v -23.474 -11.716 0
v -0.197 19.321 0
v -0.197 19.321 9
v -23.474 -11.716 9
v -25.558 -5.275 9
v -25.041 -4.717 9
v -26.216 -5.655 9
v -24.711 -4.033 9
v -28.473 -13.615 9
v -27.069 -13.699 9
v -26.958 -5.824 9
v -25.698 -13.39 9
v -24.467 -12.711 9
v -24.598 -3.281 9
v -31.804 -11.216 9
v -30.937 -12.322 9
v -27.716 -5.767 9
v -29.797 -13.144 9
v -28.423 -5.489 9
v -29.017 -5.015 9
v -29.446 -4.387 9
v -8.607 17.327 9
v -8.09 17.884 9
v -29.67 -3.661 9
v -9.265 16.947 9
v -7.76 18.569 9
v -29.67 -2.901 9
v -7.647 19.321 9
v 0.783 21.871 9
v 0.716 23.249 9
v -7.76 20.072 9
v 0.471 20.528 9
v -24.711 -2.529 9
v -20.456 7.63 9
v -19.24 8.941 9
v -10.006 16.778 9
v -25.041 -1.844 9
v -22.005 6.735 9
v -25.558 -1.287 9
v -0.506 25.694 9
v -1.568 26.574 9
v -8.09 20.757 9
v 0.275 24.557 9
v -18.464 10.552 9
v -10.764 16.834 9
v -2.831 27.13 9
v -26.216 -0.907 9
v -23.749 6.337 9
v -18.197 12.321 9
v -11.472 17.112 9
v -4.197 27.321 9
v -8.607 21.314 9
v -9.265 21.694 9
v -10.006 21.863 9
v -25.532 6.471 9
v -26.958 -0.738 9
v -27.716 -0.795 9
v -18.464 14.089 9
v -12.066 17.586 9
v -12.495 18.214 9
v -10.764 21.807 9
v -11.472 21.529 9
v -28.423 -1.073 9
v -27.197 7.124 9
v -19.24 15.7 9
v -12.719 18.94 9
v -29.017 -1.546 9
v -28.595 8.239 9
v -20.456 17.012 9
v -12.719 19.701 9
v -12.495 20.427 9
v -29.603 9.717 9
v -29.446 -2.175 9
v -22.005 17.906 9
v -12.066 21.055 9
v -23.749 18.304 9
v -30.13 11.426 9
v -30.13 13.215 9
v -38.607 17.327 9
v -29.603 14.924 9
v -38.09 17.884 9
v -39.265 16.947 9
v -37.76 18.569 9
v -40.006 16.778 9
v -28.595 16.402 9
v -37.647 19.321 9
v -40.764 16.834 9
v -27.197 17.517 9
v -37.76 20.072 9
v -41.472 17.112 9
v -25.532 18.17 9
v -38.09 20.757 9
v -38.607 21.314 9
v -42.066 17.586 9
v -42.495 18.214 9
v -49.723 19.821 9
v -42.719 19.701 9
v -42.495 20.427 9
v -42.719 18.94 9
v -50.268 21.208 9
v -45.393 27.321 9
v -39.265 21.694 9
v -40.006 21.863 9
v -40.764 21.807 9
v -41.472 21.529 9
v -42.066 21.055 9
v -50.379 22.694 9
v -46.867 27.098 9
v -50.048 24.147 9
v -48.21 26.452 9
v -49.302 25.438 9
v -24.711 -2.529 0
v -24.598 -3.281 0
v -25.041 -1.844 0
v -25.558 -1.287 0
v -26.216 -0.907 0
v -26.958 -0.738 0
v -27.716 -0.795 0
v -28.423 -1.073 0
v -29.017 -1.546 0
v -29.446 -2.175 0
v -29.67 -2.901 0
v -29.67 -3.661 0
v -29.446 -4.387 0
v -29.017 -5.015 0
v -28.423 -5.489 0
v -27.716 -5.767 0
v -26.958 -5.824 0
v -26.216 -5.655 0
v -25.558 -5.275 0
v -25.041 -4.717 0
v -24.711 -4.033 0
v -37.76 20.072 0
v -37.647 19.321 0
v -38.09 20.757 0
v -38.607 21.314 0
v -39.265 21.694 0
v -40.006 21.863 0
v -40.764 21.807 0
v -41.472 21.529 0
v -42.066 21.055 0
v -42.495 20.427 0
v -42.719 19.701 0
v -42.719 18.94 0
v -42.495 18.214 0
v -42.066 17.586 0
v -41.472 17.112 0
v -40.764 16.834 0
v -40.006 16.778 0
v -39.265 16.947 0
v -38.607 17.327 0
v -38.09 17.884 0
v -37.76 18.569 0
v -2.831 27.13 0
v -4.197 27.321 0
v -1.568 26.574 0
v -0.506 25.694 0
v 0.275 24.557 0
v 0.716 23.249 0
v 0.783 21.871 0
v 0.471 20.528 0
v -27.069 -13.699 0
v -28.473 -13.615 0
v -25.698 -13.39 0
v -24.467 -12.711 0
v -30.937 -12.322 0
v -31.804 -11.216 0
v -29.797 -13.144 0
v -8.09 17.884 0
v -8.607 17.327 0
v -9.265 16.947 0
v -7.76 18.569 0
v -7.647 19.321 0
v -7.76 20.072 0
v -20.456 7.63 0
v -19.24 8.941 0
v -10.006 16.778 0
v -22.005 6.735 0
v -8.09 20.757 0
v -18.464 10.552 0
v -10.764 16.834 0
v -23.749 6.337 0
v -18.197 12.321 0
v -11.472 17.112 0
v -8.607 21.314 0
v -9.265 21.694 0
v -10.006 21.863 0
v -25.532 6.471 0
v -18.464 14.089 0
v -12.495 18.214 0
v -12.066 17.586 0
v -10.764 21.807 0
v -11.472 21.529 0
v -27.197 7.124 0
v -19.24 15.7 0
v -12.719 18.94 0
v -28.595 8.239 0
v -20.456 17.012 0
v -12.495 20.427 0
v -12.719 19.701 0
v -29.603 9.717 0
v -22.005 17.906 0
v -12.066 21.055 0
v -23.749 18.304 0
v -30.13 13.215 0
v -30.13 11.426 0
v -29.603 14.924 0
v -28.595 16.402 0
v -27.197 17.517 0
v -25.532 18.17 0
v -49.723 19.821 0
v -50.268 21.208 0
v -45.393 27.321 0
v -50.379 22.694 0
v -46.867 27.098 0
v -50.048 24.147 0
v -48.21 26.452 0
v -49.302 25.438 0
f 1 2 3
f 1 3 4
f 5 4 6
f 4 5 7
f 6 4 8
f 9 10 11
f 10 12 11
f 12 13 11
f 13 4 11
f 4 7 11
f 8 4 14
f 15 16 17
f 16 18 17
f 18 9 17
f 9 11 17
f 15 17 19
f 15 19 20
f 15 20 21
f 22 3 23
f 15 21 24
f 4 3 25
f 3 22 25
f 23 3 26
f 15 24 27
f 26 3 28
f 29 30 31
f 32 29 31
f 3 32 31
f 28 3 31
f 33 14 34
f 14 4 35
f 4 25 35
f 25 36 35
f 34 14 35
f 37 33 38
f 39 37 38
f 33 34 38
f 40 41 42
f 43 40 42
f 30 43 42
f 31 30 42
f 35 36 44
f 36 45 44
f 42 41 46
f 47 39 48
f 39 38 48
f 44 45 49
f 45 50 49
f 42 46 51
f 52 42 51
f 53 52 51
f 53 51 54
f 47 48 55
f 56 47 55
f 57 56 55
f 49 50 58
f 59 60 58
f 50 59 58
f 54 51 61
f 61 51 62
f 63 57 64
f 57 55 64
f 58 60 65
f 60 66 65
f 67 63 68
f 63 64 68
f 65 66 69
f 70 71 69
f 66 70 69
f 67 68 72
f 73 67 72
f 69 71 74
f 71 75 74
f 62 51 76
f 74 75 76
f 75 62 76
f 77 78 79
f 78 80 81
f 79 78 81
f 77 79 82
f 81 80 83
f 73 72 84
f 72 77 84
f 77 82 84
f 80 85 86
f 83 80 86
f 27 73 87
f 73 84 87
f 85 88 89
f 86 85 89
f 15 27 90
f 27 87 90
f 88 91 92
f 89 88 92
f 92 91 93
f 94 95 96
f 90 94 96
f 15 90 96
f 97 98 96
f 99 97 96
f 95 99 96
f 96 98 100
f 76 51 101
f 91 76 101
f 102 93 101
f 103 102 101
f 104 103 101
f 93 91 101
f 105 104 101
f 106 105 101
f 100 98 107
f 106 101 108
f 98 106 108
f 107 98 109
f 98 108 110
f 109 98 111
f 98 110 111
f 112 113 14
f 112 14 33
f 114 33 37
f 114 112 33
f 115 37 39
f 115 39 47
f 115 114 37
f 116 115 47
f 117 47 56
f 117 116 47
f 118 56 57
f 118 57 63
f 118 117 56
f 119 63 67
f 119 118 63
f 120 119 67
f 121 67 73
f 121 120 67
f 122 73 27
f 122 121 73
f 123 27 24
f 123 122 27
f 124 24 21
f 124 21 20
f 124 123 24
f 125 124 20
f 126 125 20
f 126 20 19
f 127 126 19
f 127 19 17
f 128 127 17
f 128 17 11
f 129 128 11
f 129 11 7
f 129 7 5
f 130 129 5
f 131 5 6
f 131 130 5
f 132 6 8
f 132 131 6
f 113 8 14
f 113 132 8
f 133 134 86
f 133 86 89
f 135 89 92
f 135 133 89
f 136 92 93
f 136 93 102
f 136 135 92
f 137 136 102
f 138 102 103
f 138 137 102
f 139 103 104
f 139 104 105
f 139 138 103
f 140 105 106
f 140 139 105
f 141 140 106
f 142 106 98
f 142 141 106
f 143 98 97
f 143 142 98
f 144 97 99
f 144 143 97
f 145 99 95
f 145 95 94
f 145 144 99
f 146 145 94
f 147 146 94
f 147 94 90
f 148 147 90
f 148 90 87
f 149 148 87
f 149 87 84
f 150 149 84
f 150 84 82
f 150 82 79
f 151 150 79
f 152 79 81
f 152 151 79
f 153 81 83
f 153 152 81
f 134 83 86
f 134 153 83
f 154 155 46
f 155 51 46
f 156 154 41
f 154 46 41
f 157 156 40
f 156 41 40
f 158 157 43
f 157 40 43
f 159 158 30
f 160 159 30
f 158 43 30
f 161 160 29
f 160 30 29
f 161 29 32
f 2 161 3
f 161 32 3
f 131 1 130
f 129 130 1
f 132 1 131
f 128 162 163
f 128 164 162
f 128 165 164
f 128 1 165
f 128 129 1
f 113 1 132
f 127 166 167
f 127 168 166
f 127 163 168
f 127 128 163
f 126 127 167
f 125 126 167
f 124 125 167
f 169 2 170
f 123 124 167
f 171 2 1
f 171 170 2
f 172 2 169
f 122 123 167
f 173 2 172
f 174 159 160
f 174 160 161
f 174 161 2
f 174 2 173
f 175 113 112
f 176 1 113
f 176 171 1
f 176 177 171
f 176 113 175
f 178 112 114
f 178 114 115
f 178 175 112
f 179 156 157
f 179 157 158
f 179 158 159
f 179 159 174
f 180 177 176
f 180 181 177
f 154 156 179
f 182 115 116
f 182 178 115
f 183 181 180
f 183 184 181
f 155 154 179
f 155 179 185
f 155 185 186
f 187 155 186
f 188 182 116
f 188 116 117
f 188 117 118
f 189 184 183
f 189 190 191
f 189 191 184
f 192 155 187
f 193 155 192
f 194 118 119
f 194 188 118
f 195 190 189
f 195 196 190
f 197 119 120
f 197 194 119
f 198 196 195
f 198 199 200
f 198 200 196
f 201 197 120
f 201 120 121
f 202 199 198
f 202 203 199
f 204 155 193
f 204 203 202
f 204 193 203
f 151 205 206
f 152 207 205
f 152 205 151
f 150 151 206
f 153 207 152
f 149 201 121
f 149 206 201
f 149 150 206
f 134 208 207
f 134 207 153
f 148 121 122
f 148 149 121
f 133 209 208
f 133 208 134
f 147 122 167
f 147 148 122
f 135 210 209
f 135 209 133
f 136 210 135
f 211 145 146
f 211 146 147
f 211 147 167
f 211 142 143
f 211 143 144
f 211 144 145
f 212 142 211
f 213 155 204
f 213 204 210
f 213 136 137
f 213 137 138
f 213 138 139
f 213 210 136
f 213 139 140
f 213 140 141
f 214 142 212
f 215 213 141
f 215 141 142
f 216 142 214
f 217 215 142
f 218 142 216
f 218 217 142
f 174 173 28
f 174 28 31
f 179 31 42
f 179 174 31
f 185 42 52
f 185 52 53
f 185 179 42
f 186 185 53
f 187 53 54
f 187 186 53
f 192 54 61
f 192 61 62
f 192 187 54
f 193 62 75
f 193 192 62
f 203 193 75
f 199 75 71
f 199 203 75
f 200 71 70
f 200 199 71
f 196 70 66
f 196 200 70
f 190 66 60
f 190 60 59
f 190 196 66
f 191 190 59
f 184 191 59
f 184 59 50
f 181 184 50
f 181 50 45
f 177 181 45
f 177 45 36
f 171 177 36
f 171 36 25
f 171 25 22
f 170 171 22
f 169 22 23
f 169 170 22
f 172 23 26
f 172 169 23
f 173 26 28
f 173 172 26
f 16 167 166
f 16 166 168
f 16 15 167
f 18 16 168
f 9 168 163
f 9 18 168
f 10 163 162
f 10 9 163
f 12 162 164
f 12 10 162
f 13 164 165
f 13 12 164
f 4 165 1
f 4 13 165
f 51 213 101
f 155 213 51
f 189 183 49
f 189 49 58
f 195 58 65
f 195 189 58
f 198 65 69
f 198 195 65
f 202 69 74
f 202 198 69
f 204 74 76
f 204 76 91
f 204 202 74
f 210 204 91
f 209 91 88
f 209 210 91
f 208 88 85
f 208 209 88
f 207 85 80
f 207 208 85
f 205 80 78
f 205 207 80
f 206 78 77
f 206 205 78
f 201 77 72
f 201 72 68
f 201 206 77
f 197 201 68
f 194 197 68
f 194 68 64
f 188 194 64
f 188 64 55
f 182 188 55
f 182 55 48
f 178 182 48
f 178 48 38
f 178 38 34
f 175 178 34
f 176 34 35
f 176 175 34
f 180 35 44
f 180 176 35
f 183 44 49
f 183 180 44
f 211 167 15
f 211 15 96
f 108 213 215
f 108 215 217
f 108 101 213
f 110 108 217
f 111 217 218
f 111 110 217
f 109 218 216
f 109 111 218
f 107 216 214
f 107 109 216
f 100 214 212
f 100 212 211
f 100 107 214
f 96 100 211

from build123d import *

# Parameters (mm, degrees)
SKETCH_1_R      = 2.55
SKETCH_1_R_2    = 6
EXTRUDE_1_DEPTH = 9
FILLET_1_R      = 5


with BuildPart() as part:
    # 草图1 → 凸台-拉伸1 (new body)
    with BuildSketch(Plane.XY):
        Polygon((-54.053450796, 27.320514858), (5.802955665, 27.320514858), (-28.018037849, -17.774143161), align=None)
        with Locations((-40.197044335, 19.320514858)):
            Circle(SKETCH_1_R, mode=Mode.SUBTRACT)
        with Locations((-27.148108815, -3.280904448)):
            Circle(SKETCH_1_R, mode=Mode.SUBTRACT)
        with Locations((-10.197044335, 19.320514858)):
            Circle(SKETCH_1_R, mode=Mode.SUBTRACT)
        with Locations((-24.197044335, 12.320514858)):
            Circle(SKETCH_1_R_2, mode=Mode.SUBTRACT)
    extrude(amount=EXTRUDE_1_DEPTH)

    # 圆角1
    fillet_1_edges = [part.edges().sort_by_distance(p)[0] for p in [
        (-54.053450796, 27.320514858, 4.5),
        (5.802955665, 27.320514858, 4.5),
        (-28.018037849, -17.774143161, 4.5),
    ]]
    fillet(fillet_1_edges, radius=FILLET_1_R)


solid = part.part
